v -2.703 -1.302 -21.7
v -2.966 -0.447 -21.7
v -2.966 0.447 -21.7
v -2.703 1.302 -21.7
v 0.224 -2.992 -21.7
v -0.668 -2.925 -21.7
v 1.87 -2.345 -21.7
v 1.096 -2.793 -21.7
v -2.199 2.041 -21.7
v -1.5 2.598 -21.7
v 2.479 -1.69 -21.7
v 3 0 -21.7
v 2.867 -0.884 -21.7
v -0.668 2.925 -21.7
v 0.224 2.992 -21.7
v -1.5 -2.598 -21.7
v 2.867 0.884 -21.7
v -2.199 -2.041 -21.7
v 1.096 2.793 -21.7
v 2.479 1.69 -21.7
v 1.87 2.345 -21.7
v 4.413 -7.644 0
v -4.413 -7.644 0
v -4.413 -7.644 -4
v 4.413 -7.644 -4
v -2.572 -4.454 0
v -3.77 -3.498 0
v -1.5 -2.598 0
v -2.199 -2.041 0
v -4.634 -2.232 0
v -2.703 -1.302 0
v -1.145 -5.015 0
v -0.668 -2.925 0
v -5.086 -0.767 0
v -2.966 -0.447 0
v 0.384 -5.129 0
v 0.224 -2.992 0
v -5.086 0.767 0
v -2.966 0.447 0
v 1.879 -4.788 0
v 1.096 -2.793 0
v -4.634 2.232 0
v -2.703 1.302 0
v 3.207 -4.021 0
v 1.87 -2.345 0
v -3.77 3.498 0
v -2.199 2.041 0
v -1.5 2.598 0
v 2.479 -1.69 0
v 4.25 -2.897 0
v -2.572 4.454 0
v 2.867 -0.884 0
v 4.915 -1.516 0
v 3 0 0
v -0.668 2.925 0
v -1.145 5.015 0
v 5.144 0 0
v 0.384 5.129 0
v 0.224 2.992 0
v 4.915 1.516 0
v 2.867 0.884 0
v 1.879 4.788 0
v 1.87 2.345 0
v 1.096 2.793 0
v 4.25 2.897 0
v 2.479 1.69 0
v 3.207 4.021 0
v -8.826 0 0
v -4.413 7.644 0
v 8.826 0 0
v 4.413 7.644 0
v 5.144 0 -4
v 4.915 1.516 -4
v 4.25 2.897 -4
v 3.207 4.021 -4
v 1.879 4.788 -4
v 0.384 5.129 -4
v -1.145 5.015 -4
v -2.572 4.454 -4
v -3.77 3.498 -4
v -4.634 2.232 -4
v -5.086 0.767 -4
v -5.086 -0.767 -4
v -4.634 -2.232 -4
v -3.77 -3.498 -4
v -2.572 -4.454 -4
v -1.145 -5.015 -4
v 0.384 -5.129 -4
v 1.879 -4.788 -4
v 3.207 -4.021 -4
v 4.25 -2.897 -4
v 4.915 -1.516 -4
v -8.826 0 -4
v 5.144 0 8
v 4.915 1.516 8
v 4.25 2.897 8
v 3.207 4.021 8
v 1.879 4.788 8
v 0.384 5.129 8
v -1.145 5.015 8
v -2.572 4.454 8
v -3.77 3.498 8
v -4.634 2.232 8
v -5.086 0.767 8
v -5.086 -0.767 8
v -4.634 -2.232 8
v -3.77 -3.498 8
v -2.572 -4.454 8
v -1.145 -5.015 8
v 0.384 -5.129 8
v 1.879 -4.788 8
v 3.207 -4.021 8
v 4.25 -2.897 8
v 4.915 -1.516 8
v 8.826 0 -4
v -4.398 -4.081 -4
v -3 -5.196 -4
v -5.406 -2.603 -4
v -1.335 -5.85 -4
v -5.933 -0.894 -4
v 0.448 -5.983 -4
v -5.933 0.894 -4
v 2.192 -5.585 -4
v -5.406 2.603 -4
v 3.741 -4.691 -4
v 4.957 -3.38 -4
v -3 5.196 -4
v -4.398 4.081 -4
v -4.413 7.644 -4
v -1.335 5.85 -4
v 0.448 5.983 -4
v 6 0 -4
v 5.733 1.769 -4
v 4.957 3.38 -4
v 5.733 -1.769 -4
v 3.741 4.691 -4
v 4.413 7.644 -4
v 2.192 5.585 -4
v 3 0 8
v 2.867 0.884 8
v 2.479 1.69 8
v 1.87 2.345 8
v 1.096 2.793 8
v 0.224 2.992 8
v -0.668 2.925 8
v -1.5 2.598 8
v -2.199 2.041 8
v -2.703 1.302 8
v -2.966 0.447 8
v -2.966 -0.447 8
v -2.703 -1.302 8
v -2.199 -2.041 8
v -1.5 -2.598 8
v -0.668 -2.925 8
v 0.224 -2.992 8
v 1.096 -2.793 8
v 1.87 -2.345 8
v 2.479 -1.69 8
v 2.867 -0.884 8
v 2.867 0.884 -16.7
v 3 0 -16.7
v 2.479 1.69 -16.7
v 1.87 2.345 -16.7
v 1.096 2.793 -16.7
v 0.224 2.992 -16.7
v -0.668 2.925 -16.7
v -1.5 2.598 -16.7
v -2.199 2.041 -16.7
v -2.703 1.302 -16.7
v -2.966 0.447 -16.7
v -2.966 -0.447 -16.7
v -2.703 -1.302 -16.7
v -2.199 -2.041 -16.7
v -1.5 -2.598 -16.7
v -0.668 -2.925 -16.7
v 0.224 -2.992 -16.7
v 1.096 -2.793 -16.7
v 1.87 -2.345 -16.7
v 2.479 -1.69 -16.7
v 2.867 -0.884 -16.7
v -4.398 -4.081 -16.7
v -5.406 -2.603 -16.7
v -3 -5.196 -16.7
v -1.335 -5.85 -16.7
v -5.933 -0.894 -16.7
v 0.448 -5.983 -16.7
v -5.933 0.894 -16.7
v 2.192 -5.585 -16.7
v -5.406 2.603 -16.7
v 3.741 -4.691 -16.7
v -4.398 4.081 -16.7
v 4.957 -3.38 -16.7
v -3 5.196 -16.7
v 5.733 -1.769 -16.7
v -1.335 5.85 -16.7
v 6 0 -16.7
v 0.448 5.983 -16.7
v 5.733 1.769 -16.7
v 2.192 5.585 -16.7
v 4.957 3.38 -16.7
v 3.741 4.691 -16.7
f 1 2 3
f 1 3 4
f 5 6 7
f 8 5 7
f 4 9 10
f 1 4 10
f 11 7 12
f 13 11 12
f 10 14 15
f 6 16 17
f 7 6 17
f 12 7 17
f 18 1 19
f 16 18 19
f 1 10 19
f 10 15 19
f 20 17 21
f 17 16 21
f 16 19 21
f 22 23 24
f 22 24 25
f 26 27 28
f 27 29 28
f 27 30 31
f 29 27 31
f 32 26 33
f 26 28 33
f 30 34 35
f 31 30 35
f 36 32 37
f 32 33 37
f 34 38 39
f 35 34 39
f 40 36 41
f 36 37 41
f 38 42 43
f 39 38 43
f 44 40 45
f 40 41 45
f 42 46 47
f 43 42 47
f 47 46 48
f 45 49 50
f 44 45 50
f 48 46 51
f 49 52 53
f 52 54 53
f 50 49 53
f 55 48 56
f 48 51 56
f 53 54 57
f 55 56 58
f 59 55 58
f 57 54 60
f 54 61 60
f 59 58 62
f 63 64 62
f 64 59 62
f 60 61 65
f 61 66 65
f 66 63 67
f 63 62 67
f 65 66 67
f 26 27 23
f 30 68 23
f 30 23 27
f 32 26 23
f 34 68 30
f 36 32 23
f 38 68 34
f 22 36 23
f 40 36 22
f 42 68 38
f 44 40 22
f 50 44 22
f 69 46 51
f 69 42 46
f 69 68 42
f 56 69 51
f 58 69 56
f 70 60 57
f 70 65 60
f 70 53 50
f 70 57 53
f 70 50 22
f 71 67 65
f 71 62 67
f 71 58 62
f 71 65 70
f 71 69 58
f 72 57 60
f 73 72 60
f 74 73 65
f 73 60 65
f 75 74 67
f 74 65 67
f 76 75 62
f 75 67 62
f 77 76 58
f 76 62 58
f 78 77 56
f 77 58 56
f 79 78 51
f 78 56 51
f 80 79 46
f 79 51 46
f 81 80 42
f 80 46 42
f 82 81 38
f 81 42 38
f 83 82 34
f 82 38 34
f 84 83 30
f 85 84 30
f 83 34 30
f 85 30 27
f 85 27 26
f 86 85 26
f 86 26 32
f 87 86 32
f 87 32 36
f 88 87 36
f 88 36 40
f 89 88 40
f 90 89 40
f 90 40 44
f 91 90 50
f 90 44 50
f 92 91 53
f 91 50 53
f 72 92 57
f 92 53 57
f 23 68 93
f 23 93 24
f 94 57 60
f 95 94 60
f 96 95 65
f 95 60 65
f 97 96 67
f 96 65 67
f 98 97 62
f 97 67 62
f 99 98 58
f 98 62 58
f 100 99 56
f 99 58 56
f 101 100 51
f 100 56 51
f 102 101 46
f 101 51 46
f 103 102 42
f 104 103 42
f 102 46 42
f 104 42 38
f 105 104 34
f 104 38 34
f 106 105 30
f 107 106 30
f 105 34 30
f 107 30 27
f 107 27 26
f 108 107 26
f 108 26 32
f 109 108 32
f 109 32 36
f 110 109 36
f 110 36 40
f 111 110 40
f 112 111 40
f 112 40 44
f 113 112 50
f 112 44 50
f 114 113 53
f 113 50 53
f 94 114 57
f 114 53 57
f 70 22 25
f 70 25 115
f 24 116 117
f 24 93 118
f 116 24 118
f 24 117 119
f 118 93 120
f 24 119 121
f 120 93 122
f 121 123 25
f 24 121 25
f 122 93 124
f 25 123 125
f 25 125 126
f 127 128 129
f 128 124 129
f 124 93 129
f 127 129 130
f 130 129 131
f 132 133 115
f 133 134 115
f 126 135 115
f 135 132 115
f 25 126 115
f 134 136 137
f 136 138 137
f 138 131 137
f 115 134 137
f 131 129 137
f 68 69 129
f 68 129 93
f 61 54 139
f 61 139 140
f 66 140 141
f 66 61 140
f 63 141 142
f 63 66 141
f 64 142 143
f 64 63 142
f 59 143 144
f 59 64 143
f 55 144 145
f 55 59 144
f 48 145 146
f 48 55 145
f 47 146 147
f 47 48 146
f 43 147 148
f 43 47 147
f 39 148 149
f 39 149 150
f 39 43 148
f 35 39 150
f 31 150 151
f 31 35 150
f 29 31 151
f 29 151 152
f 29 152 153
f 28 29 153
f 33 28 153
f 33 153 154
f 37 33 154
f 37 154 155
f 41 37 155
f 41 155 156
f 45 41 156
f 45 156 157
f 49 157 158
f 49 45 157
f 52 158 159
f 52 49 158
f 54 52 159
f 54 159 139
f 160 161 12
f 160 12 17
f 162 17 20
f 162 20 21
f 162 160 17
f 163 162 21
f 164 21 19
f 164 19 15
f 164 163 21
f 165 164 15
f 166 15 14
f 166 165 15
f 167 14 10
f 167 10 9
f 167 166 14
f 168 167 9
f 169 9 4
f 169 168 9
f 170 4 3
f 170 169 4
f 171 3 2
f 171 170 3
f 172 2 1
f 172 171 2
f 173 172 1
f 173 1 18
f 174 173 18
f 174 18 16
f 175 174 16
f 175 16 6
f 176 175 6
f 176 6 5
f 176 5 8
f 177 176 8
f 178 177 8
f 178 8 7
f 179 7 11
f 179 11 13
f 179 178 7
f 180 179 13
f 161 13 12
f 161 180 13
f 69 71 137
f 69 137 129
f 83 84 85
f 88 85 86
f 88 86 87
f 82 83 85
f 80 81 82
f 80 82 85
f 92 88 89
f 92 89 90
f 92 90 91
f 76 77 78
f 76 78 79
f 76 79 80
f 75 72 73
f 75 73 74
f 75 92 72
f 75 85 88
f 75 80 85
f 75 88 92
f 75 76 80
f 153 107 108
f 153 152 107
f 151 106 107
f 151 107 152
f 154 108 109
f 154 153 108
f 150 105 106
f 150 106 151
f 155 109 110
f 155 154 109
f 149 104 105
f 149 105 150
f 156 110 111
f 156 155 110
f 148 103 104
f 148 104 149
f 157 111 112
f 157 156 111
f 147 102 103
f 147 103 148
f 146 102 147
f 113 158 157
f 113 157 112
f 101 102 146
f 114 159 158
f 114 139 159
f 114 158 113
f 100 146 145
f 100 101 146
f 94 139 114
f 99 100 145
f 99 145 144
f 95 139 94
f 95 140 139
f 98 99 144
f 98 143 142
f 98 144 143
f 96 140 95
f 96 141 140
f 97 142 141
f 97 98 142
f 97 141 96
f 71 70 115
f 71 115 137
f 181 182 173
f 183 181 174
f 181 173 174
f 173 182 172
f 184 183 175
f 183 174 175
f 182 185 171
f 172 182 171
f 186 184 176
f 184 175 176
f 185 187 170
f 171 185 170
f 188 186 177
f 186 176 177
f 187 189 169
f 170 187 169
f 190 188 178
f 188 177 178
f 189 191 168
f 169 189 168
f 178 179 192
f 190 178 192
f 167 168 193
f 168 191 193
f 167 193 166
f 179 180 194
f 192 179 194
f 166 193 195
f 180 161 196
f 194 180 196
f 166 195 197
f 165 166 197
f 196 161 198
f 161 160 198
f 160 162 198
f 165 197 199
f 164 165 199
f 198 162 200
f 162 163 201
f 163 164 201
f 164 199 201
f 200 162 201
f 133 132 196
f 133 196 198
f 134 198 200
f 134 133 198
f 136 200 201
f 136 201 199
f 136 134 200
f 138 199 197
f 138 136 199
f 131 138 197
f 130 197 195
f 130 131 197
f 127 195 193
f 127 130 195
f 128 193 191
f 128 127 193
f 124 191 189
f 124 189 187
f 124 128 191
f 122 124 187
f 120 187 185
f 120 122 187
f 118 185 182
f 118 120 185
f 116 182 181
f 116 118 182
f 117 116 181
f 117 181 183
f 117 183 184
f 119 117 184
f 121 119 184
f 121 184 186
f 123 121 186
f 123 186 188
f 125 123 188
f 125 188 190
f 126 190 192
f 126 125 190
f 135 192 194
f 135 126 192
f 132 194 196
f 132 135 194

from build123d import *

# Parameters (mm, degrees)
SKETCH1_R           = 5.1435
SKETCH1_R_2         = 3
BOSS_EXTRUDE1_DEPTH = 8
SKETCH1_3_R         = 5.1435
BOSS_EXTRUDE2_DEPTH = 4
BOSS_EXTRUDE3_START = -4
SKETCH1_5_R         = 6
SKETCH1_5_R_2       = 5.1435
SKETCH1_5_R_3       = 3
BOSS_EXTRUDE3_DEPTH = 12.7
BOSS_EXTRUDE4_START = -16.7
SKETCH1_7_R         = 3
BOSS_EXTRUDE4_DEPTH = 5


with BuildPart() as part:
    # Sketch1 → Boss-Extrude1 (new body)
    with BuildSketch(Plane.XY):
        Circle(SKETCH1_R)
        Circle(SKETCH1_R_2, mode=Mode.SUBTRACT)
    extrude(amount=BOSS_EXTRUDE1_DEPTH)


with BuildPart() as body_2:
    # Sketch1<3> → Boss-Extrude2 (new body)
    with BuildSketch(Plane.XY):
        Polygon((8.825953565, 0), (4.412976783, 7.6435), (-4.412976783, 7.6435), (-8.825953565, 0), (-4.412976783, -7.6435), (4.412976783, -7.6435), align=None)
        Circle(SKETCH1_3_R, mode=Mode.SUBTRACT)
    extrude(amount=-BOSS_EXTRUDE2_DEPTH)

    # Sketch1<5> → Boss-Extrude3 (add)
    with BuildSketch(Plane.XY.offset(BOSS_EXTRUDE3_START)):
        Circle(SKETCH1_5_R)
        Circle(SKETCH1_5_R_2, mode=Mode.SUBTRACT)
        Circle(SKETCH1_5_R_2)
        Circle(SKETCH1_5_R_3, mode=Mode.SUBTRACT)
        Circle(SKETCH1_5_R_3)
    extrude(amount=-BOSS_EXTRUDE3_DEPTH)

    # Sketch1<7> → Boss-Extrude4 (add)
    with BuildSketch(Plane.XY.offset(BOSS_EXTRUDE4_START)):
        Circle(SKETCH1_7_R)
    extrude(amount=-BOSS_EXTRUDE4_DEPTH)


solid = Compound([part.part, body_2.part])
